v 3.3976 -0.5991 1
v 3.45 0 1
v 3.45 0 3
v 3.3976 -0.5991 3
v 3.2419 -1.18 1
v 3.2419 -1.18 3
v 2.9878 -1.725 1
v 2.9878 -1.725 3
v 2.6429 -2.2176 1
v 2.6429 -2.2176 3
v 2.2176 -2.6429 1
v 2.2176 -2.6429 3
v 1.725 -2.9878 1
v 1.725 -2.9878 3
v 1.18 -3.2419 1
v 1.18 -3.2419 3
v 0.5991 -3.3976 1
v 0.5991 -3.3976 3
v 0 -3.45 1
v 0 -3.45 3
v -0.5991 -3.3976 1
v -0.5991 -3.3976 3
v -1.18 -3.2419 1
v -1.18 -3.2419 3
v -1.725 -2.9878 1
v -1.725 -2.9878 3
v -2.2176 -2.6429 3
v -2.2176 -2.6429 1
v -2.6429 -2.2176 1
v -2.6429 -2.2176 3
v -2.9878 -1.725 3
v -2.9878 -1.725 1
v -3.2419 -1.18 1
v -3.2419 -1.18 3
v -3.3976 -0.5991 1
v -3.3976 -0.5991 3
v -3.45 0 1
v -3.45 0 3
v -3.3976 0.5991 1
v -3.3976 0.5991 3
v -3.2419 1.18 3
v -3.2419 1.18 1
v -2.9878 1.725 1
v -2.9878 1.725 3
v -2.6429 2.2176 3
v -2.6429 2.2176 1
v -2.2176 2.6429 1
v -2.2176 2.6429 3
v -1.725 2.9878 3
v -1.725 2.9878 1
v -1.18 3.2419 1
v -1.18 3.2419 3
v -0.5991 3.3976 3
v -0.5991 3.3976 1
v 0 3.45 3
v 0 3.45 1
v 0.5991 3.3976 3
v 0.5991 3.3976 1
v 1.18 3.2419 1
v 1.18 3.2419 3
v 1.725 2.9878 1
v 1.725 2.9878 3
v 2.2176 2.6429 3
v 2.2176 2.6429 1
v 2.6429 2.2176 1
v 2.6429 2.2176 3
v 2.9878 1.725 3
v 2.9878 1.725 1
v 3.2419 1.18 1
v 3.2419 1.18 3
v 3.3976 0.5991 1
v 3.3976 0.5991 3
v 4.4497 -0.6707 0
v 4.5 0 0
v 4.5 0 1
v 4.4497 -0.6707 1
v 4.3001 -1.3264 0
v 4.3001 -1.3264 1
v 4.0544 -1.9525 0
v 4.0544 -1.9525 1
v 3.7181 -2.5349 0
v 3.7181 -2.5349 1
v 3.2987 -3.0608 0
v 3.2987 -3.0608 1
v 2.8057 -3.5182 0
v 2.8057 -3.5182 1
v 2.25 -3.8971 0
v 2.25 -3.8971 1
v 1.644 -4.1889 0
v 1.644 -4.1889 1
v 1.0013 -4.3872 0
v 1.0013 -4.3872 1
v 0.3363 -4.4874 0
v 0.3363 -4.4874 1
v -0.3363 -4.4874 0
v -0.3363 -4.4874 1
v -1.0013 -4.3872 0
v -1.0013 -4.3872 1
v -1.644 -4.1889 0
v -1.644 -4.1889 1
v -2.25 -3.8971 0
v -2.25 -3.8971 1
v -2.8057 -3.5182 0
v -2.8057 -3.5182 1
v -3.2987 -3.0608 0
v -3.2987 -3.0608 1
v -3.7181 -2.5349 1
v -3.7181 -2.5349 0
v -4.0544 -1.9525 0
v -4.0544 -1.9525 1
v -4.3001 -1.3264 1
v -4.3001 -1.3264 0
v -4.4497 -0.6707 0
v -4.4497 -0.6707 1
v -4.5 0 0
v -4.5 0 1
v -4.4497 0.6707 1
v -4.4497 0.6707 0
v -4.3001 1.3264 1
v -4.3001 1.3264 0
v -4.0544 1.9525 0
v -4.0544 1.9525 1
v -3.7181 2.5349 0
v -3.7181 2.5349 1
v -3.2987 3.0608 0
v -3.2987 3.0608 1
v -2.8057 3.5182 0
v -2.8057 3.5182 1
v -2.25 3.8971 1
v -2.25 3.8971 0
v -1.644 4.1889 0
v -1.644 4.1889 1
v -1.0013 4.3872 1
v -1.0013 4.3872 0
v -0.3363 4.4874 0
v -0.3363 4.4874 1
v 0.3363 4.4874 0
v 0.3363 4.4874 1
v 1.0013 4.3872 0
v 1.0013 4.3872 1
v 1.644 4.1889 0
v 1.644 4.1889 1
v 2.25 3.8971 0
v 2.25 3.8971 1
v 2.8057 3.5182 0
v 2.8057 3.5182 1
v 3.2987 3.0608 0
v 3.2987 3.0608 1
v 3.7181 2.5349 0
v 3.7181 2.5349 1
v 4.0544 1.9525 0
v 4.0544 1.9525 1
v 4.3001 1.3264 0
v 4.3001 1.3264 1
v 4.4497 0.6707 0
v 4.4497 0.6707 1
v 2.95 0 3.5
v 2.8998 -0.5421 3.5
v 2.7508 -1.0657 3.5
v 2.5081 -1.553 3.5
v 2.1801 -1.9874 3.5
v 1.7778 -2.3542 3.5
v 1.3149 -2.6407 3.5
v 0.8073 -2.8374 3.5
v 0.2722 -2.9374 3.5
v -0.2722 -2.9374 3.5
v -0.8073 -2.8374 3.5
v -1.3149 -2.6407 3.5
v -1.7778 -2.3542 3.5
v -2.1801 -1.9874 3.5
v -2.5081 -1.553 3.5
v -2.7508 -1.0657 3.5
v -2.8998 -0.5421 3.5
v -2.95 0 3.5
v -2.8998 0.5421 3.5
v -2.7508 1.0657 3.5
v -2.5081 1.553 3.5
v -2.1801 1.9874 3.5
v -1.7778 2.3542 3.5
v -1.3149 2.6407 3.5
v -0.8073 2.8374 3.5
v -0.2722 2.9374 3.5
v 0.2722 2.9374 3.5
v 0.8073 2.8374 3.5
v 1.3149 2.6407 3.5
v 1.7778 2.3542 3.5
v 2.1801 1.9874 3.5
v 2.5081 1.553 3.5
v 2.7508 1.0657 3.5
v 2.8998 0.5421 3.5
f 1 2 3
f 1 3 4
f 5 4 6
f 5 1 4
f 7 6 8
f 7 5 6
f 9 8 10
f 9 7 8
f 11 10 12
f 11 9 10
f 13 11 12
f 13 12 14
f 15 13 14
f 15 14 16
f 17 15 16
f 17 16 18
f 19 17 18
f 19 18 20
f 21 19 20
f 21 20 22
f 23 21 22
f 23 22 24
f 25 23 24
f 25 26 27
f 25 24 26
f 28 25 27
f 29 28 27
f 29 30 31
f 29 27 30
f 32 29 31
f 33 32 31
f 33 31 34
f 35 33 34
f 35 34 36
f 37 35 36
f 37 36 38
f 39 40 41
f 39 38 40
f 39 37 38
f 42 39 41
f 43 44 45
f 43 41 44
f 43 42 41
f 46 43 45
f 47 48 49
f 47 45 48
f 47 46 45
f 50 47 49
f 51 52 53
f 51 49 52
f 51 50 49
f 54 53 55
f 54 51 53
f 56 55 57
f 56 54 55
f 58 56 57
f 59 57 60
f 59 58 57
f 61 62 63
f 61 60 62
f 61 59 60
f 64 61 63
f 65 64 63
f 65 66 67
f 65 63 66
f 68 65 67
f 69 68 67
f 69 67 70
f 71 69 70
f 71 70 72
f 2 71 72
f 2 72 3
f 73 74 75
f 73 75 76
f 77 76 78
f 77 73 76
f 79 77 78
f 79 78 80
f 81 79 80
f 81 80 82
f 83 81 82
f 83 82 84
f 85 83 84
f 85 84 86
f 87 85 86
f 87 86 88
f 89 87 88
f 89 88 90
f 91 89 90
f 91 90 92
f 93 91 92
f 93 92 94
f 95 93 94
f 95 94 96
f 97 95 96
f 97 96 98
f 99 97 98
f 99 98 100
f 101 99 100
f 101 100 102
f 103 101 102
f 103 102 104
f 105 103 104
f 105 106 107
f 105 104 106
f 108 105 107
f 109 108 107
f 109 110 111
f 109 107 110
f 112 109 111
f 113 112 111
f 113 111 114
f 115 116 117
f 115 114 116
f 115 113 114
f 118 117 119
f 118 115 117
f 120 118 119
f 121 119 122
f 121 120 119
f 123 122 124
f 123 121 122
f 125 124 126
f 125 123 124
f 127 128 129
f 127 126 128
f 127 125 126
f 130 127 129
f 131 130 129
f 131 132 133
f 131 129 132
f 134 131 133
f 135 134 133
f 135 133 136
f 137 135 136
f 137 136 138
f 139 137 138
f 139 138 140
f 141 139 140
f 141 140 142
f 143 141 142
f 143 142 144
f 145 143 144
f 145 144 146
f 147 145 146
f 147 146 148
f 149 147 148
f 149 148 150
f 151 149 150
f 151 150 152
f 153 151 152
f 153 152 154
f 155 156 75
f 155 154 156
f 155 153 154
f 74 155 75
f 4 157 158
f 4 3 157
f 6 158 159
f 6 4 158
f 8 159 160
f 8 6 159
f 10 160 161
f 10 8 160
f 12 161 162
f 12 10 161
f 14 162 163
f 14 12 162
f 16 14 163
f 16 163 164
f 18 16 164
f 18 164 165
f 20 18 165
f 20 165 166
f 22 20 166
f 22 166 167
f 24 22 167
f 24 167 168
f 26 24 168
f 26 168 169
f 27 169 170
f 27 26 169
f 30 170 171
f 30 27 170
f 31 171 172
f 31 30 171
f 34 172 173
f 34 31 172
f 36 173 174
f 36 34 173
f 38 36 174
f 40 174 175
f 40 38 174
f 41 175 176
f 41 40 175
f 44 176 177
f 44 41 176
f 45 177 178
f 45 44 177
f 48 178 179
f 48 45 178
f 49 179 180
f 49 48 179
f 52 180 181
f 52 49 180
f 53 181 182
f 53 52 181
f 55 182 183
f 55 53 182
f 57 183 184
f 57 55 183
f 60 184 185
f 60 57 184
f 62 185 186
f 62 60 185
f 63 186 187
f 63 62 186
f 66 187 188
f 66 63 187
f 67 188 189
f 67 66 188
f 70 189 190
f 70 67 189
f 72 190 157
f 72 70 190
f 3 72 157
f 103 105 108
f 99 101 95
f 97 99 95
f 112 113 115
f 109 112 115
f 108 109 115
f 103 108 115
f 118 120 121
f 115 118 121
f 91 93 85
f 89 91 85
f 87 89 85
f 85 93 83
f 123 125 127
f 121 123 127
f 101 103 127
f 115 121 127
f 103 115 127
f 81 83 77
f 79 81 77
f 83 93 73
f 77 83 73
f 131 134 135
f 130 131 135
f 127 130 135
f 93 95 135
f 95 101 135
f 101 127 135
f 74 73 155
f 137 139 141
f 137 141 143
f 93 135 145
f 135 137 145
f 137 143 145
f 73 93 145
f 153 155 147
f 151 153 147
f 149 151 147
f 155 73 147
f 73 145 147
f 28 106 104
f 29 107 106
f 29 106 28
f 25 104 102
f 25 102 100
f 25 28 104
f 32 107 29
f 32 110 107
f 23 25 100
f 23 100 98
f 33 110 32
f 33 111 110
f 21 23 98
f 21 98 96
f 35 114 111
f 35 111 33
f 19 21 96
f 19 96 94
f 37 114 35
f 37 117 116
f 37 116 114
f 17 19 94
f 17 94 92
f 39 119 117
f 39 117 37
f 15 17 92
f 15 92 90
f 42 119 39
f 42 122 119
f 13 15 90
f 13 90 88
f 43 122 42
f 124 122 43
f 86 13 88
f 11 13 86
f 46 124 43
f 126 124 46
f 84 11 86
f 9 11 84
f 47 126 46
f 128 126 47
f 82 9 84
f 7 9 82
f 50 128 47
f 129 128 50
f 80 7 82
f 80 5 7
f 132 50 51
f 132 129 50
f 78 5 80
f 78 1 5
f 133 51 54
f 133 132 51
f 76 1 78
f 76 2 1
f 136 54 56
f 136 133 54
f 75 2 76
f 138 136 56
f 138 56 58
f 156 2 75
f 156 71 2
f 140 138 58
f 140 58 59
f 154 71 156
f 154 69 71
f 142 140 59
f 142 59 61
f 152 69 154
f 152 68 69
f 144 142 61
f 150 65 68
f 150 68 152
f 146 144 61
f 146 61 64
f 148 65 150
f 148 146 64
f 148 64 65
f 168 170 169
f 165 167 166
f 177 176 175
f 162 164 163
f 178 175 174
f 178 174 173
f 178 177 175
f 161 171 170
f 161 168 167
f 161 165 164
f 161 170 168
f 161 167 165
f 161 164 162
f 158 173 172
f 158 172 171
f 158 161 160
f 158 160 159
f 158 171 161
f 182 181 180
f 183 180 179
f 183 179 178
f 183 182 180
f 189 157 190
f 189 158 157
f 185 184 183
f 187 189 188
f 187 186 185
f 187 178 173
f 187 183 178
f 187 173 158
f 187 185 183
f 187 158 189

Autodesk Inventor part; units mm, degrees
ref_plane "YZ Plane" through (0, 0, 0) normal (1, 0, 0) x (0, 1, 0)
ref_plane "XZ Plane" through (0, 0, 0) normal (0, 1, 0) x (-1, 0, 0)
ref_plane "XY Plane" through (0, 0, 0) normal (0, 0, 1) x (1, 0, 0)
sketch "Skizze1" plane through (0, 0, 0) normal (0, 0, 1) x (1, 0, 0)
  circle A0 centre (0, 0) radius 4.5
  dimension "d0" = 9
extrude "Extrusion1" add sketch "Skizze1" along normal blind 1
sketch "Skizze2" plane through (0, 0, 1) normal (0, 0, 1) x (1, 0, 0)
  circle A0 centre (0, 0) radius 4.5 projected
  circle A1 centre (0, 0) radius 3.45
  dimension "d3" = 6.9
extrude "Extrusion2" add sketch "Skizze2" along normal blind 2.5 contours A1
chamfer "Fase2" distance 0.5 angle 45 1 edges at (-3.45, 0, 3.5)
properties part number "Servorückseitenlagerachse" material "Siliziumnitrid"
